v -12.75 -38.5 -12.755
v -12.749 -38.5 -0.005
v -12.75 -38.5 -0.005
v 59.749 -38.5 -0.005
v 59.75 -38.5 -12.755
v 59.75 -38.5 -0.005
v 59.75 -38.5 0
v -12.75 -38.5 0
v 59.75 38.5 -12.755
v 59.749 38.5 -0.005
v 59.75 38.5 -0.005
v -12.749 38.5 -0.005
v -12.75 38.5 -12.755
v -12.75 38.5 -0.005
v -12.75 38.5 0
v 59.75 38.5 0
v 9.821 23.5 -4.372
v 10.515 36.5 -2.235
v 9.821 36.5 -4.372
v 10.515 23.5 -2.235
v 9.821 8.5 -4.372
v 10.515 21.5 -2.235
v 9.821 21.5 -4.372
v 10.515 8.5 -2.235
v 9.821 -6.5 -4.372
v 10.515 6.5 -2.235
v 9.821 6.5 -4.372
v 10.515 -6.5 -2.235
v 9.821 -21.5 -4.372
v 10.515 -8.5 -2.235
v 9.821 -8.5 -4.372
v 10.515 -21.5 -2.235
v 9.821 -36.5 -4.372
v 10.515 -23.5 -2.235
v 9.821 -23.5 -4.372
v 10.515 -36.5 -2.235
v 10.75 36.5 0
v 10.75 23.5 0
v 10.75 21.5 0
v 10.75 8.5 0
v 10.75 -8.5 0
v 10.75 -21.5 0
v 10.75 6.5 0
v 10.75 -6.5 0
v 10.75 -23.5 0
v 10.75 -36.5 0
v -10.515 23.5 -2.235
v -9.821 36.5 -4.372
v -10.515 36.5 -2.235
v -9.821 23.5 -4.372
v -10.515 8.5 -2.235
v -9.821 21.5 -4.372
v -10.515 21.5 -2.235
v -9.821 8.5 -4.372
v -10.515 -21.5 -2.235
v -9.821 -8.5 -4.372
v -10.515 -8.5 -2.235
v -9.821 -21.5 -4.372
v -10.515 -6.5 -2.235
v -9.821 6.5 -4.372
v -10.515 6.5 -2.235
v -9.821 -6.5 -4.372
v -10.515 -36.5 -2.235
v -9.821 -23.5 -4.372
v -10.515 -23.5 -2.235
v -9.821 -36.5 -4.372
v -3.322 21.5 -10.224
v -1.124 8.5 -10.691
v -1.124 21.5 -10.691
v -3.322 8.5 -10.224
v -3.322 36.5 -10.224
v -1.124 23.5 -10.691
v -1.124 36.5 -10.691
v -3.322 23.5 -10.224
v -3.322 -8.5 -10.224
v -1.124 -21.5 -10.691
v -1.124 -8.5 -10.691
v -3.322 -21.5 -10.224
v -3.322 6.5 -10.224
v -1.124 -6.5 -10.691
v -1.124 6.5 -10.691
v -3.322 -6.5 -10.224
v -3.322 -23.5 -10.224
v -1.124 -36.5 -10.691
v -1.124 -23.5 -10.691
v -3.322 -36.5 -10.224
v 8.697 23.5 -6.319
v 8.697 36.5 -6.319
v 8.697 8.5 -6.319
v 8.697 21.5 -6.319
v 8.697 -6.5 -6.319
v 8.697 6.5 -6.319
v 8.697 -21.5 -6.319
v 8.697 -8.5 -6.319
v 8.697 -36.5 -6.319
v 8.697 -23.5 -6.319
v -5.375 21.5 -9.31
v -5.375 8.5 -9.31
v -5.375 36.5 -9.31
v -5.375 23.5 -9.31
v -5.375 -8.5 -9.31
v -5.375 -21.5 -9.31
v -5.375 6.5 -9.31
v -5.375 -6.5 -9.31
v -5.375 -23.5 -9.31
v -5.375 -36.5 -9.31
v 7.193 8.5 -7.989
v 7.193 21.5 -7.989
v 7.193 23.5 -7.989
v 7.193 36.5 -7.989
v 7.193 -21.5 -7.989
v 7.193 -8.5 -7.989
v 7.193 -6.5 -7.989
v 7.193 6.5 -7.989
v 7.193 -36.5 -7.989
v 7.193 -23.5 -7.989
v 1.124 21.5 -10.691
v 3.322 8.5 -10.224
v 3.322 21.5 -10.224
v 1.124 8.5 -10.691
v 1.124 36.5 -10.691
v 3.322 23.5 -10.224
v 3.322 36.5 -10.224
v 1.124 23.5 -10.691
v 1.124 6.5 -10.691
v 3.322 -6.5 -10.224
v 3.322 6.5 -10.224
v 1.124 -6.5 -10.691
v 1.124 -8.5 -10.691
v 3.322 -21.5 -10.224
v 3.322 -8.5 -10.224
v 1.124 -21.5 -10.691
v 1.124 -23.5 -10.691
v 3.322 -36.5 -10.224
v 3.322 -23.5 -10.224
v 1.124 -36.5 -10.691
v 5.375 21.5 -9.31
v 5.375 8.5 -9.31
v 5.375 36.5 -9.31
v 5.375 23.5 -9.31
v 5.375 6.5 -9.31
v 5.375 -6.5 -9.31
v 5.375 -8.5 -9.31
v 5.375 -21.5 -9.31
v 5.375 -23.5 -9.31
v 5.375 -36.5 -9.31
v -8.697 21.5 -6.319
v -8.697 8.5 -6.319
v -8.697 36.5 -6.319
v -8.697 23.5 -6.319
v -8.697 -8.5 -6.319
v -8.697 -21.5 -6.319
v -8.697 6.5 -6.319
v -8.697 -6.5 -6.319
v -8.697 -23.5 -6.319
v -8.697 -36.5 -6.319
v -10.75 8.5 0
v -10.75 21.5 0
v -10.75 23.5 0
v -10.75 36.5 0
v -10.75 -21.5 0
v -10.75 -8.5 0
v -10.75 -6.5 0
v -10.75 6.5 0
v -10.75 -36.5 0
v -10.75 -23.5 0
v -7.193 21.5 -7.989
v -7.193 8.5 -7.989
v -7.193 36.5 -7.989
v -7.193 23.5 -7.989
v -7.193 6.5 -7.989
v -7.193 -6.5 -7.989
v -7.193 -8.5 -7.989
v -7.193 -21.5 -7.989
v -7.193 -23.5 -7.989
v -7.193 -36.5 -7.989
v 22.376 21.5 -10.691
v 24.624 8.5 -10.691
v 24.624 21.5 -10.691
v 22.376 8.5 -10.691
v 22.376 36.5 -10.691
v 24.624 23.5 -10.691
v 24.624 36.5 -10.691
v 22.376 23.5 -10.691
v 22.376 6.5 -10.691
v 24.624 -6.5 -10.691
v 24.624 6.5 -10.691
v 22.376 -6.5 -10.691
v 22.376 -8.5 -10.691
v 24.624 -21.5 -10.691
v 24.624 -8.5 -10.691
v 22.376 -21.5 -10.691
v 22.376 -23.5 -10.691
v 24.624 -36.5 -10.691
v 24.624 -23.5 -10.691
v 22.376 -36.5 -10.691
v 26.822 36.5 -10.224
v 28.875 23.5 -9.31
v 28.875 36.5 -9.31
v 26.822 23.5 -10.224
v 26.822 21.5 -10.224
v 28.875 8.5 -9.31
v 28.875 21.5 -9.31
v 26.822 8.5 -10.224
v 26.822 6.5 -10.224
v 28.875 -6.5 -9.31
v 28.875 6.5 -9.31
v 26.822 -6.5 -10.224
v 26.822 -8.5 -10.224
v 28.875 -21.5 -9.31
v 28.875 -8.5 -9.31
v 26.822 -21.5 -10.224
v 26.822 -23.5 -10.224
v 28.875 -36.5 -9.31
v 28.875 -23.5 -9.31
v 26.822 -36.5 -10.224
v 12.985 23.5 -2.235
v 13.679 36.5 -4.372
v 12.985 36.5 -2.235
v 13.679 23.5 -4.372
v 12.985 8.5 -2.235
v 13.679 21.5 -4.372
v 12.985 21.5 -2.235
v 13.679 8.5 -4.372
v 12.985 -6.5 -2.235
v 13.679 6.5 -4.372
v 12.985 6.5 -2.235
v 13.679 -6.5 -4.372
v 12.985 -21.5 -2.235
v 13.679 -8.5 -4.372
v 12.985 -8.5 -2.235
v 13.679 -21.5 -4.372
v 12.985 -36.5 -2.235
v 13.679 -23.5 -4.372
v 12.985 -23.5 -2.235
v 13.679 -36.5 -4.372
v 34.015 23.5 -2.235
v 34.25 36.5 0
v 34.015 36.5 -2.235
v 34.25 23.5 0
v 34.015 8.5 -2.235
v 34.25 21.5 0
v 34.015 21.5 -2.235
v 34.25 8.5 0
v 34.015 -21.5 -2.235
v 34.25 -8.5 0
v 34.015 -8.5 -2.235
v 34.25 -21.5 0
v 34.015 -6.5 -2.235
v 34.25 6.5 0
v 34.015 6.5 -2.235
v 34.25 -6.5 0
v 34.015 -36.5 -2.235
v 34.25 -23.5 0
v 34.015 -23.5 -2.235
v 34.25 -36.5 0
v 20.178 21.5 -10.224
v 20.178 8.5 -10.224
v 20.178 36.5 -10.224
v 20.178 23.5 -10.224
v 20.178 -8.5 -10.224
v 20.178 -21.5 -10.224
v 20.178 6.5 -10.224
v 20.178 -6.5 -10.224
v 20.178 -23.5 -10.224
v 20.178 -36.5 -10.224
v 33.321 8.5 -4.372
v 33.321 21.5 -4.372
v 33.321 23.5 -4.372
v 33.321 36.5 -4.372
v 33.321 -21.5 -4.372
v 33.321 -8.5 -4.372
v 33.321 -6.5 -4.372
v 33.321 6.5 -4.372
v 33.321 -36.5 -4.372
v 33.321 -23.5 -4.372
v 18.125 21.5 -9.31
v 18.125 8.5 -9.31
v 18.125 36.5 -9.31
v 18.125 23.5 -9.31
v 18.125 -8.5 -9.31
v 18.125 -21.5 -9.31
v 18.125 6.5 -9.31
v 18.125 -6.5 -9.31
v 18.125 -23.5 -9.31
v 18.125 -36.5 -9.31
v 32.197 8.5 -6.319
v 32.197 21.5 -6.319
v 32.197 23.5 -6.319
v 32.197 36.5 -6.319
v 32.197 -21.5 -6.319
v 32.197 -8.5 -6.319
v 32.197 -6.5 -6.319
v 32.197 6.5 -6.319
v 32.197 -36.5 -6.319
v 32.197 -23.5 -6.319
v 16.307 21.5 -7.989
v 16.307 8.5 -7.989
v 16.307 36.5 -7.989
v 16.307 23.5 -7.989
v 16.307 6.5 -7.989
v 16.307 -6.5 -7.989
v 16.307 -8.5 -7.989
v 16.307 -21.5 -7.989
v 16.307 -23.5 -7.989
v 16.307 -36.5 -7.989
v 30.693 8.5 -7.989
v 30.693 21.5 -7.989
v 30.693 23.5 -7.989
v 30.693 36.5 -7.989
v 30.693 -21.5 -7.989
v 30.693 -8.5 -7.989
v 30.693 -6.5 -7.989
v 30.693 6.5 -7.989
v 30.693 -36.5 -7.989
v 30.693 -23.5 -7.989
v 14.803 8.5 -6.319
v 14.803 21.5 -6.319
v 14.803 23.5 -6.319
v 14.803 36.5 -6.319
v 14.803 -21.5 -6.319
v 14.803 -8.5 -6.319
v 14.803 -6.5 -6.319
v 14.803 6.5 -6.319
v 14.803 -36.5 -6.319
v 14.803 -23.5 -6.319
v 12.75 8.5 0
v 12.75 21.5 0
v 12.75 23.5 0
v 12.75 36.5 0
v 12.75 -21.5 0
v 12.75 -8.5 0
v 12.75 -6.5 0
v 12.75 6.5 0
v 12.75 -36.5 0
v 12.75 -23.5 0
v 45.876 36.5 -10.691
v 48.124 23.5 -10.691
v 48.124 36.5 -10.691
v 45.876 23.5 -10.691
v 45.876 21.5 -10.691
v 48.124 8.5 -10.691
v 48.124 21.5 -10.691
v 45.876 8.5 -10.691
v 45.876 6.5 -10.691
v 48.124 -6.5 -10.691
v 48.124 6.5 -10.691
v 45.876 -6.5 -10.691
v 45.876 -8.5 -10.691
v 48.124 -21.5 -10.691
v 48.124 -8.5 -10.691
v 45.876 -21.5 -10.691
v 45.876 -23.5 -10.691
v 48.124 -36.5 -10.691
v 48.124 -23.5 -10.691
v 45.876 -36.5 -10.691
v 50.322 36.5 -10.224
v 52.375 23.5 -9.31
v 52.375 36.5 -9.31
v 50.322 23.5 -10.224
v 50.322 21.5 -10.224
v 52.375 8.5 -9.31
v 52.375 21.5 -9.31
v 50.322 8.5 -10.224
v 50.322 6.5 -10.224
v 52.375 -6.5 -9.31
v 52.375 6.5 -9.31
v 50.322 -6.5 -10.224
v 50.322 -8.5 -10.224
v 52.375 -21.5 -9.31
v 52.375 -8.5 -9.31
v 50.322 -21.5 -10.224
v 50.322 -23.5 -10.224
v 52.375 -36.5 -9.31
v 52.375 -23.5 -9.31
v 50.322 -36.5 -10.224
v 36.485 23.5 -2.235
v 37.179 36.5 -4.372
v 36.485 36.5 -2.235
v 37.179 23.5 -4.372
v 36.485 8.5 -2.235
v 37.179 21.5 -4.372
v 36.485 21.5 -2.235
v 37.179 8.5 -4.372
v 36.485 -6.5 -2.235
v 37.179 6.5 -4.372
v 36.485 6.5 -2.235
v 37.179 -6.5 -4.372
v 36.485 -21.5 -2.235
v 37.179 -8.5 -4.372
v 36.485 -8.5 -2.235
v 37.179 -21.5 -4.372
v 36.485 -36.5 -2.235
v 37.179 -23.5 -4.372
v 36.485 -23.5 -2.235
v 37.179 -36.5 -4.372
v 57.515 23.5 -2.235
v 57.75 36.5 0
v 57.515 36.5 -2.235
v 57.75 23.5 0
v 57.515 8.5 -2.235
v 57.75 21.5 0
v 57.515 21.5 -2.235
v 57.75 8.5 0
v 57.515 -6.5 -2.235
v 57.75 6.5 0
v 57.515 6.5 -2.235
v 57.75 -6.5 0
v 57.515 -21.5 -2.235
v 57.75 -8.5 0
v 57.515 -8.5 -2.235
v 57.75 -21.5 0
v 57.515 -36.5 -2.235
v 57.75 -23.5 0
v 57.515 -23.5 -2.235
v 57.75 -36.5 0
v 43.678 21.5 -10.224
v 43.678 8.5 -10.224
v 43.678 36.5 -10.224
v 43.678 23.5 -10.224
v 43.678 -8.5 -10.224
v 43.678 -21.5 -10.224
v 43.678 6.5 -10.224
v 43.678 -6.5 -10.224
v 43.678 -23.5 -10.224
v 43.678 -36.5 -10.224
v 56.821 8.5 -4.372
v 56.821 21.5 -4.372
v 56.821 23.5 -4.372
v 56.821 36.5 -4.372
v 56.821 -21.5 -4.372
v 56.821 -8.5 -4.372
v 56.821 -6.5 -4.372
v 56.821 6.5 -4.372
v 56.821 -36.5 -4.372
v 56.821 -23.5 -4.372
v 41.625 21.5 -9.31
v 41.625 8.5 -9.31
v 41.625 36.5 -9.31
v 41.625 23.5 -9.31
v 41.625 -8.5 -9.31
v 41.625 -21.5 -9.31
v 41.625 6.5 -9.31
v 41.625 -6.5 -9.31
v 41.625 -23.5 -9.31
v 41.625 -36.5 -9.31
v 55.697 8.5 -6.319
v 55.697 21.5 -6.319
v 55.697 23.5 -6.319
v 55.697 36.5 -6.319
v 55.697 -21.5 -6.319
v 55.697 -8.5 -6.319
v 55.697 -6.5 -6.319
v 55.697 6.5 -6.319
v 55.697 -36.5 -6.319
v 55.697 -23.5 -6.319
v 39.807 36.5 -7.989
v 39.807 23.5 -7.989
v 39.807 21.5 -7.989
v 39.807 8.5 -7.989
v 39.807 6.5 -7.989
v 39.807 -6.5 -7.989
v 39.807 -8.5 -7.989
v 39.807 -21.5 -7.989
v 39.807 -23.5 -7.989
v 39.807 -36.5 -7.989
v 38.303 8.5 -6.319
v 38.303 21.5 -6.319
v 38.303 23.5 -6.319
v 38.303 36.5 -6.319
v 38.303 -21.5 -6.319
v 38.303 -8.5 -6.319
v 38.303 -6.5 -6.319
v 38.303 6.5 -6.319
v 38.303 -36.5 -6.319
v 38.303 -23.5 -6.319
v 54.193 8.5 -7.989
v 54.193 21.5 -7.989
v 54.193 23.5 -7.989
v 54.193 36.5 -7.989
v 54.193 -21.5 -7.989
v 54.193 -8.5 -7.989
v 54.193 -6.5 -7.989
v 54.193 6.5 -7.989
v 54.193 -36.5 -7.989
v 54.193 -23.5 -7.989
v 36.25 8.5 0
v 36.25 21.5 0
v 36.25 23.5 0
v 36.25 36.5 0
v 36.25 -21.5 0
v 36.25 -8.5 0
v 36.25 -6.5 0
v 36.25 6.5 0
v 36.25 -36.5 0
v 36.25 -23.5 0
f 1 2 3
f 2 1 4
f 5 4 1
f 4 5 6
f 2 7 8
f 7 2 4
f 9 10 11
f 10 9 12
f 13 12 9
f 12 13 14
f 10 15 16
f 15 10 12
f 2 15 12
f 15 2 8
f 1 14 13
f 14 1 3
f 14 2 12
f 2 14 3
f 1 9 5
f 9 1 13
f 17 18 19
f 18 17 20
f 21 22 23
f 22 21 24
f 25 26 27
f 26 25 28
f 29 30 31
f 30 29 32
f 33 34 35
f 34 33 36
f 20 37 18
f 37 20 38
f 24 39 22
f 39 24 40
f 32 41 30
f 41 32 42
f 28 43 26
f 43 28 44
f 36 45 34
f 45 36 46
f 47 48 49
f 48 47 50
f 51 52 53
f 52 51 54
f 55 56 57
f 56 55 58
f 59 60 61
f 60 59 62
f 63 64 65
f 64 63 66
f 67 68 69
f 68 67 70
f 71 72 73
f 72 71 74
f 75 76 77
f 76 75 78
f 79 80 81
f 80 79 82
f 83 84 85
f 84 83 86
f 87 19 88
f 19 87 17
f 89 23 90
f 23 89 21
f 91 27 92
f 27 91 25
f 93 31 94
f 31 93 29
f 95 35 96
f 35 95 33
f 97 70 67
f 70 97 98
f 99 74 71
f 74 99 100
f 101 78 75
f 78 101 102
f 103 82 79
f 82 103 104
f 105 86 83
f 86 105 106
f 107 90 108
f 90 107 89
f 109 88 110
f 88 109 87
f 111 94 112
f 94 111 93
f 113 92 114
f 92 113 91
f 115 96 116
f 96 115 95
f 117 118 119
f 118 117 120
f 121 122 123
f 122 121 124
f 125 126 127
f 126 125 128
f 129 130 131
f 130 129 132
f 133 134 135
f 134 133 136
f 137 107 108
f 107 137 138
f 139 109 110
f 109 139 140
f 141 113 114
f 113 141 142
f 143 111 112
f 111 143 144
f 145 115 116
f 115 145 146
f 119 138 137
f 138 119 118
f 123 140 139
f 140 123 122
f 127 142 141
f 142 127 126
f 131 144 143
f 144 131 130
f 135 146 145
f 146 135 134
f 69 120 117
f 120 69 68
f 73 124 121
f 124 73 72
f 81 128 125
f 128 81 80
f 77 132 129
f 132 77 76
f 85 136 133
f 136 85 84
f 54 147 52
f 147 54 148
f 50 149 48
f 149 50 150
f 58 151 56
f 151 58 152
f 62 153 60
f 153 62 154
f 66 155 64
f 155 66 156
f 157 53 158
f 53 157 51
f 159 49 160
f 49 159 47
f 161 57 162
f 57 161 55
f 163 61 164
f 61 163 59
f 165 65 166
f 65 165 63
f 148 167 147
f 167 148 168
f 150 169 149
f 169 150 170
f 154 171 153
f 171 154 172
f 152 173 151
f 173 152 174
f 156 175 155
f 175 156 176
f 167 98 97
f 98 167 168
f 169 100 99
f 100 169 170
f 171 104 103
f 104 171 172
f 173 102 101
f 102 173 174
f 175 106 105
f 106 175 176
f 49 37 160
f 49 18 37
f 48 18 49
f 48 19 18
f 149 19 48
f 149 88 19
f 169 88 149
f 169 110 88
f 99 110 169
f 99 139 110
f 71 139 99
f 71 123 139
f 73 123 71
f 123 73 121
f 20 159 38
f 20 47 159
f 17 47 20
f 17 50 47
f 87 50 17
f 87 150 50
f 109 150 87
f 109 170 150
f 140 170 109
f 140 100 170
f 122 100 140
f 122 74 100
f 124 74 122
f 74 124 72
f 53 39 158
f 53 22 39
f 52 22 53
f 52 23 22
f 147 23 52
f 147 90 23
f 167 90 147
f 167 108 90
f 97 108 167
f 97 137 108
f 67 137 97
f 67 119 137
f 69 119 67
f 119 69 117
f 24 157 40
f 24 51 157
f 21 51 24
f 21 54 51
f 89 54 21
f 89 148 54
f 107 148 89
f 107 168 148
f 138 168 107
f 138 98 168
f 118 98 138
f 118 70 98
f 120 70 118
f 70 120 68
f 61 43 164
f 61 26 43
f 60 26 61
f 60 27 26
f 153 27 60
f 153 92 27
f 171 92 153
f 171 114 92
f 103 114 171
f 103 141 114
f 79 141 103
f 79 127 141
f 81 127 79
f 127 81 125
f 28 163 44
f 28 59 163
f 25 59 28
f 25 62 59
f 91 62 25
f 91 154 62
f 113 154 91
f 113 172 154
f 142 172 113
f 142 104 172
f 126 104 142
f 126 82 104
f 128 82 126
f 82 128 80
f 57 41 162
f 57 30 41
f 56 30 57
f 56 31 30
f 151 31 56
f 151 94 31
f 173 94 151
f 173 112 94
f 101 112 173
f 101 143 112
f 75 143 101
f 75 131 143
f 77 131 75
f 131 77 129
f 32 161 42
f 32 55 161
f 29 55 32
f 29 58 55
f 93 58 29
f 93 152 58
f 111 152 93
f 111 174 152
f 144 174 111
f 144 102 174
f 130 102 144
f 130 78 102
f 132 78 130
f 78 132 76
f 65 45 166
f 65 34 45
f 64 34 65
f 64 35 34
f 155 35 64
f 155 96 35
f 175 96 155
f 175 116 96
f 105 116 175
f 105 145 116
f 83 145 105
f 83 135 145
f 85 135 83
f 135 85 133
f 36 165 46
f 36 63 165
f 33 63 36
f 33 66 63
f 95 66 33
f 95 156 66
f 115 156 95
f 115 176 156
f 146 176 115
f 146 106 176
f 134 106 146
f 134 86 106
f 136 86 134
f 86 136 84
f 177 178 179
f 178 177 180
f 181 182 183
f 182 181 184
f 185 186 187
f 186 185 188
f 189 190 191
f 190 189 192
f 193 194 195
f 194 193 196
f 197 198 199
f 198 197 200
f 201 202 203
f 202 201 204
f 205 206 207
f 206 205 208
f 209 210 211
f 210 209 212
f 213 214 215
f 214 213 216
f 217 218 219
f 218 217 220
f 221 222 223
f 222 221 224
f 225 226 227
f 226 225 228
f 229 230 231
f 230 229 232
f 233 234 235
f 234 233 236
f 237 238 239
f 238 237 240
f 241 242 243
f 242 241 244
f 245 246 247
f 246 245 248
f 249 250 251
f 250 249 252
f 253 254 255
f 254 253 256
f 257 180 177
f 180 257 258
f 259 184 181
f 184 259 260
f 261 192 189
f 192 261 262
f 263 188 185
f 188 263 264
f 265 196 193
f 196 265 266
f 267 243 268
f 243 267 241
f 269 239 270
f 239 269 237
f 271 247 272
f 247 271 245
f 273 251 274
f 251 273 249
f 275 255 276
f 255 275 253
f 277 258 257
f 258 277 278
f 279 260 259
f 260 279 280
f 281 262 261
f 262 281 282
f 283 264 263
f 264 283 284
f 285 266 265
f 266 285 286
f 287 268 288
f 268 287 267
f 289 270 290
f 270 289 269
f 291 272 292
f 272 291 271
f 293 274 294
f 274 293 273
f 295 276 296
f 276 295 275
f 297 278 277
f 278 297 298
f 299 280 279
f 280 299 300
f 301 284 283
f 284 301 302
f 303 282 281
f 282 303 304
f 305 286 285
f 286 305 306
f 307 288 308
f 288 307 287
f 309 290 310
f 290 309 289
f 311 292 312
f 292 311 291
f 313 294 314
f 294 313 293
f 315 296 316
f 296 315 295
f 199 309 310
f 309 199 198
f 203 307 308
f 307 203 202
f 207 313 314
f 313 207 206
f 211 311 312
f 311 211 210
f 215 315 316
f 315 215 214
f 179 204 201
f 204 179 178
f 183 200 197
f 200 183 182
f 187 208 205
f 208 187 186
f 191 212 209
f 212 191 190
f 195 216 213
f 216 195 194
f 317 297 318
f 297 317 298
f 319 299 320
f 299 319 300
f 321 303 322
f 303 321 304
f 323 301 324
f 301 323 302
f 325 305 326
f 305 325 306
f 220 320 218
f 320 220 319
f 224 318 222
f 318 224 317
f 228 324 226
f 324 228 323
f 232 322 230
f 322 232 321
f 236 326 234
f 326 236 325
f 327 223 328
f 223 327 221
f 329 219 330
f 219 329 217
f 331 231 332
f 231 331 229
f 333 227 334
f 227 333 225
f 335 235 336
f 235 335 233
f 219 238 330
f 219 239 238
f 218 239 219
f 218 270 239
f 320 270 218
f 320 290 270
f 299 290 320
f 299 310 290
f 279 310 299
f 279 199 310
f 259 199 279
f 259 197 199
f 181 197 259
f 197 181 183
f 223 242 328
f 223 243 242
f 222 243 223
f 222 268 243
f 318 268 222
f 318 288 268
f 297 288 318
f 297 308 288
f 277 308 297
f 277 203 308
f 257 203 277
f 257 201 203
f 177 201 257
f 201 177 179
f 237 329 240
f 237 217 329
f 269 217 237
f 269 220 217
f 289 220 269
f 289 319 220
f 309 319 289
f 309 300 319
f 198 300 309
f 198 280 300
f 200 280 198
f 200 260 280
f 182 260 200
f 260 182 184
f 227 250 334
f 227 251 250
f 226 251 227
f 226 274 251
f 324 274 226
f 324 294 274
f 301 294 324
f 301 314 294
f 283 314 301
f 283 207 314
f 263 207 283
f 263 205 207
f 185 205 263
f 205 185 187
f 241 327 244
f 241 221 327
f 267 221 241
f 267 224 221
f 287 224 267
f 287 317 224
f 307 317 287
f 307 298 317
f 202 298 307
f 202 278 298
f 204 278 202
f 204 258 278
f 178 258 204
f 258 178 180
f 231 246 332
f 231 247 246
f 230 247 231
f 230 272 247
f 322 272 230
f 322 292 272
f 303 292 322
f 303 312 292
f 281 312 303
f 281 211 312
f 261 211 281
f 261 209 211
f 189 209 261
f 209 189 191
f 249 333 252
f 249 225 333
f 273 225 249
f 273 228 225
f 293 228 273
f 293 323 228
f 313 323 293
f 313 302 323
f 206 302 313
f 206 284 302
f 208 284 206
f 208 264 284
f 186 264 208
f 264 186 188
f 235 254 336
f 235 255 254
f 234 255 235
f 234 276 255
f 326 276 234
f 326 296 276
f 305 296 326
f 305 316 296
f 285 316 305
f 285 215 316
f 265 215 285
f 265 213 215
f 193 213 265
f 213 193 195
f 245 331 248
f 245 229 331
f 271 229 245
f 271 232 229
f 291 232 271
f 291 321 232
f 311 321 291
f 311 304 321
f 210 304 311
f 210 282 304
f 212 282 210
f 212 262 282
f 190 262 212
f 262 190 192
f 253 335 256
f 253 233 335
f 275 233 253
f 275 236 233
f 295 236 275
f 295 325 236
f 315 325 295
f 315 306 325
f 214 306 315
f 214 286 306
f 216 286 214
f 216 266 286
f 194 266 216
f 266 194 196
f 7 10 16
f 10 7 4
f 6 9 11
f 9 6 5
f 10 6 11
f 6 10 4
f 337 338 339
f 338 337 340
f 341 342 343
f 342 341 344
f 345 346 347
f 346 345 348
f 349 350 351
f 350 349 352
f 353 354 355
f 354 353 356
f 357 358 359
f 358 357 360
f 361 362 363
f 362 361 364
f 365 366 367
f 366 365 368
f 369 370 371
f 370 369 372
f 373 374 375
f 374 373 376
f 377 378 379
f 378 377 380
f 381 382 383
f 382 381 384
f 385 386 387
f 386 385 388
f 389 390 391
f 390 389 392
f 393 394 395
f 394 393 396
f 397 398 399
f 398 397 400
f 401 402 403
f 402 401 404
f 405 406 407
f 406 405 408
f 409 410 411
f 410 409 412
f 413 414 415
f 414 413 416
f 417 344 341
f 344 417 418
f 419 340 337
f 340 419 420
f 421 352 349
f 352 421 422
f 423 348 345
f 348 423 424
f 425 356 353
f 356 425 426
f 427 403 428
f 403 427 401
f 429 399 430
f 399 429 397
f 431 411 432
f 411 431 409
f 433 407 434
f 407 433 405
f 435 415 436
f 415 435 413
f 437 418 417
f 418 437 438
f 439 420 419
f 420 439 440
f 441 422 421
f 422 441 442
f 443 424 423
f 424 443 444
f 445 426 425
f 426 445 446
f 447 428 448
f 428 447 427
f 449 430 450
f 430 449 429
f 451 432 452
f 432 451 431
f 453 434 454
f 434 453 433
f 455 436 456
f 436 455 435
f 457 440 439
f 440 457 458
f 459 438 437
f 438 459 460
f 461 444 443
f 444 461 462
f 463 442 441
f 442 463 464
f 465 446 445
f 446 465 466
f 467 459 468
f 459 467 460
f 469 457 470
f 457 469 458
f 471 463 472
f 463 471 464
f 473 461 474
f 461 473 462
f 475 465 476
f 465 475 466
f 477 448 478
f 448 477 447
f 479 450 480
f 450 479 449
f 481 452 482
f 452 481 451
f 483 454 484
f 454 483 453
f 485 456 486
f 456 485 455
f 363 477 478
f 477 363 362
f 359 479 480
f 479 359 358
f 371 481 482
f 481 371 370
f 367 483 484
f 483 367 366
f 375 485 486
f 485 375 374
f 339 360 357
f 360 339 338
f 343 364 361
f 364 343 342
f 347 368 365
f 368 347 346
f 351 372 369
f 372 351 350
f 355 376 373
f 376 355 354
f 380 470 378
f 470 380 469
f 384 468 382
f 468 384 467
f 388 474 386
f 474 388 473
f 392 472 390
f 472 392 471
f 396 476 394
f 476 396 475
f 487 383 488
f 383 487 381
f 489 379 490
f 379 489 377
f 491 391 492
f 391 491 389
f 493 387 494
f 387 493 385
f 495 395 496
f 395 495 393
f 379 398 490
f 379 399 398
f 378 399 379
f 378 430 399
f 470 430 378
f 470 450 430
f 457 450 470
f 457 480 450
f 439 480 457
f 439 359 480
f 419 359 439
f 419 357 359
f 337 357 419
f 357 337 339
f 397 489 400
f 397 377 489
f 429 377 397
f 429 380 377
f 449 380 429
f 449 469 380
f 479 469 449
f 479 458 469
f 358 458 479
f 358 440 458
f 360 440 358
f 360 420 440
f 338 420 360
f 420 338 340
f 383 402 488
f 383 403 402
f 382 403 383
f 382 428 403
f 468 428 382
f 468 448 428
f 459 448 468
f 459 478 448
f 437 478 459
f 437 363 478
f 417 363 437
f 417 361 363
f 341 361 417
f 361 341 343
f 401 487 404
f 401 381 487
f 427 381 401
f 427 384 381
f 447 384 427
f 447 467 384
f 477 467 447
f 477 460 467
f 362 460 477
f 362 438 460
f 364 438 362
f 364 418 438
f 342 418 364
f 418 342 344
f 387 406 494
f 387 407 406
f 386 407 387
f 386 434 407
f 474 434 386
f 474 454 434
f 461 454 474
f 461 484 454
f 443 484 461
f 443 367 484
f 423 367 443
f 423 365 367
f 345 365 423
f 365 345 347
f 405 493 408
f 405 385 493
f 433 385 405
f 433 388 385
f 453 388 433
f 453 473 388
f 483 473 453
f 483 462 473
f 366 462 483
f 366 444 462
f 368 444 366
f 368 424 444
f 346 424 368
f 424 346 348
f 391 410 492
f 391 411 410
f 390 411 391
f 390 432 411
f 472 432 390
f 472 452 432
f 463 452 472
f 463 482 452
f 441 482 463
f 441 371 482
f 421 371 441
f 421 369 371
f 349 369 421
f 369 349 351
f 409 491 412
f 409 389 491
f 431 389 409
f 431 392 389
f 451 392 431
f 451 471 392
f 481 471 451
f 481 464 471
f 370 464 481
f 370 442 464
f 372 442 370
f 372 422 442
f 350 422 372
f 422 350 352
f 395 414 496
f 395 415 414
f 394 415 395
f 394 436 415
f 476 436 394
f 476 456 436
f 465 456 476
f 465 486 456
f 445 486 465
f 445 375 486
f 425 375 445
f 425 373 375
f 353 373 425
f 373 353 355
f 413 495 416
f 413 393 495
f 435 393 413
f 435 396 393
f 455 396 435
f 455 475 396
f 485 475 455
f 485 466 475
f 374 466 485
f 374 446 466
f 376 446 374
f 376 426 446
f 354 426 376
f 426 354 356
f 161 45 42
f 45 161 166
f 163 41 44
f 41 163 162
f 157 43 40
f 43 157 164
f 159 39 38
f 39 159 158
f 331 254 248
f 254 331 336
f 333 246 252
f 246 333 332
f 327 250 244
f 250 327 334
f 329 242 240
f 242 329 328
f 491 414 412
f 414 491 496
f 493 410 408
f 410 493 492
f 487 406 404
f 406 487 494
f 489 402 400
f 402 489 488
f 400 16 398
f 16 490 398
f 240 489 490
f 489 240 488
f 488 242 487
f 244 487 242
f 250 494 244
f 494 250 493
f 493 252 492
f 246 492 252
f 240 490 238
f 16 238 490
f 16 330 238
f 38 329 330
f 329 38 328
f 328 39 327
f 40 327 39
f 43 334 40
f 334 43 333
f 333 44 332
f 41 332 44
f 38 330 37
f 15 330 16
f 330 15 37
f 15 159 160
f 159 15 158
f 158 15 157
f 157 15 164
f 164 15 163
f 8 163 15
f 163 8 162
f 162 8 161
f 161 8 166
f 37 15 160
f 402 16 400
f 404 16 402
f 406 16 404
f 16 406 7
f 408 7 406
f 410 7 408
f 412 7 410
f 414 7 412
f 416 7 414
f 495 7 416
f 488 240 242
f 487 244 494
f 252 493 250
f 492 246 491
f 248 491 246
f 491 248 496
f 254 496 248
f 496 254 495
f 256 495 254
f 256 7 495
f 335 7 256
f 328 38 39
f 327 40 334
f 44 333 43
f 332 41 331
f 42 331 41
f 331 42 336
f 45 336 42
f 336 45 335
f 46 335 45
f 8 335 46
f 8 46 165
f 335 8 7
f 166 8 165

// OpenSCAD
//	Customizable Bobbin Thread Spool Holder
//	Copyright by Drato Lesandar - Anika Uhlemann - RobotMama

// Number of rows
numRows = 3;

// Number of Spools in 1 row
numSpools = 5;

// Height of each spool in mm (determines the distance of dividers in a row)
heightSpool = 13;

// Thickness of dividers between each spool in mm
dividerThickness = 2;

// Radius of Spools in mm (Determines Size of each row)
radiusSpool = 10.25;

// Wall Thickness of every row in mm
wallThickness = 2;

// True = Flat Bottom for easy printability, false = rounded bottom
flatBottom = 1; //[1:true, 0:false]

rotate([90,0,0])
difference() {
   
    lengthHolder = (heightSpool+dividerThickness)*numSpools+dividerThickness;
    radiusOuter = radiusSpool+0.5+wallThickness;
    offset = wallThickness*0.5;//0.96;
    widthHolder = numRows*2*(radiusOuter-offset);
    
    union() {
        for (i = [0:numRows-1]) {
            difference() {
                // Outer Cyl
                 if (flatBottom) {
                    union() {
                    translate ([i*2*(radiusOuter-offset),0,0])
                    cylinder(lengthHolder, r = radiusOuter, center = true);
                    translate ([i*((radiusOuter-offset)*2),-(radiusOuter+0.01)*0.5,0])
                    cube([radiusOuter*2, radiusOuter,lengthHolder], center = true);
                    }
                }
                else {
                    translate ([i*2*(radiusOuter-offset),0,0])
                    cylinder(lengthHolder, r = radiusOuter, center = true);
                }
                // Cutout: inner Cyl
                translate ([i*2*(radiusOuter-offset),0,0])
                cylinder(lengthHolder+10, r = radiusSpool+0.5, center = true);
            }
            for (j = [0:numSpools]) {
            // Divider
                translate ([i*2*(radiusOuter-offset),
                            0,
                            j*(heightSpool+dividerThickness)-lengthHolder*0.5])
                cylinder(dividerThickness, r = radiusSpool+0.5, center = false);
            }
        }
        
    }
    //Cut away upper half of rows
    translate ([-(radiusOuter),0,-0.5*(heightSpool+dividerThickness*2+10)*numSpools])
    cube ([ numRows*2*(radiusOuter), 
            radiusOuter, 
            (heightSpool+dividerThickness*2+10)*numSpools], center = false);
}
